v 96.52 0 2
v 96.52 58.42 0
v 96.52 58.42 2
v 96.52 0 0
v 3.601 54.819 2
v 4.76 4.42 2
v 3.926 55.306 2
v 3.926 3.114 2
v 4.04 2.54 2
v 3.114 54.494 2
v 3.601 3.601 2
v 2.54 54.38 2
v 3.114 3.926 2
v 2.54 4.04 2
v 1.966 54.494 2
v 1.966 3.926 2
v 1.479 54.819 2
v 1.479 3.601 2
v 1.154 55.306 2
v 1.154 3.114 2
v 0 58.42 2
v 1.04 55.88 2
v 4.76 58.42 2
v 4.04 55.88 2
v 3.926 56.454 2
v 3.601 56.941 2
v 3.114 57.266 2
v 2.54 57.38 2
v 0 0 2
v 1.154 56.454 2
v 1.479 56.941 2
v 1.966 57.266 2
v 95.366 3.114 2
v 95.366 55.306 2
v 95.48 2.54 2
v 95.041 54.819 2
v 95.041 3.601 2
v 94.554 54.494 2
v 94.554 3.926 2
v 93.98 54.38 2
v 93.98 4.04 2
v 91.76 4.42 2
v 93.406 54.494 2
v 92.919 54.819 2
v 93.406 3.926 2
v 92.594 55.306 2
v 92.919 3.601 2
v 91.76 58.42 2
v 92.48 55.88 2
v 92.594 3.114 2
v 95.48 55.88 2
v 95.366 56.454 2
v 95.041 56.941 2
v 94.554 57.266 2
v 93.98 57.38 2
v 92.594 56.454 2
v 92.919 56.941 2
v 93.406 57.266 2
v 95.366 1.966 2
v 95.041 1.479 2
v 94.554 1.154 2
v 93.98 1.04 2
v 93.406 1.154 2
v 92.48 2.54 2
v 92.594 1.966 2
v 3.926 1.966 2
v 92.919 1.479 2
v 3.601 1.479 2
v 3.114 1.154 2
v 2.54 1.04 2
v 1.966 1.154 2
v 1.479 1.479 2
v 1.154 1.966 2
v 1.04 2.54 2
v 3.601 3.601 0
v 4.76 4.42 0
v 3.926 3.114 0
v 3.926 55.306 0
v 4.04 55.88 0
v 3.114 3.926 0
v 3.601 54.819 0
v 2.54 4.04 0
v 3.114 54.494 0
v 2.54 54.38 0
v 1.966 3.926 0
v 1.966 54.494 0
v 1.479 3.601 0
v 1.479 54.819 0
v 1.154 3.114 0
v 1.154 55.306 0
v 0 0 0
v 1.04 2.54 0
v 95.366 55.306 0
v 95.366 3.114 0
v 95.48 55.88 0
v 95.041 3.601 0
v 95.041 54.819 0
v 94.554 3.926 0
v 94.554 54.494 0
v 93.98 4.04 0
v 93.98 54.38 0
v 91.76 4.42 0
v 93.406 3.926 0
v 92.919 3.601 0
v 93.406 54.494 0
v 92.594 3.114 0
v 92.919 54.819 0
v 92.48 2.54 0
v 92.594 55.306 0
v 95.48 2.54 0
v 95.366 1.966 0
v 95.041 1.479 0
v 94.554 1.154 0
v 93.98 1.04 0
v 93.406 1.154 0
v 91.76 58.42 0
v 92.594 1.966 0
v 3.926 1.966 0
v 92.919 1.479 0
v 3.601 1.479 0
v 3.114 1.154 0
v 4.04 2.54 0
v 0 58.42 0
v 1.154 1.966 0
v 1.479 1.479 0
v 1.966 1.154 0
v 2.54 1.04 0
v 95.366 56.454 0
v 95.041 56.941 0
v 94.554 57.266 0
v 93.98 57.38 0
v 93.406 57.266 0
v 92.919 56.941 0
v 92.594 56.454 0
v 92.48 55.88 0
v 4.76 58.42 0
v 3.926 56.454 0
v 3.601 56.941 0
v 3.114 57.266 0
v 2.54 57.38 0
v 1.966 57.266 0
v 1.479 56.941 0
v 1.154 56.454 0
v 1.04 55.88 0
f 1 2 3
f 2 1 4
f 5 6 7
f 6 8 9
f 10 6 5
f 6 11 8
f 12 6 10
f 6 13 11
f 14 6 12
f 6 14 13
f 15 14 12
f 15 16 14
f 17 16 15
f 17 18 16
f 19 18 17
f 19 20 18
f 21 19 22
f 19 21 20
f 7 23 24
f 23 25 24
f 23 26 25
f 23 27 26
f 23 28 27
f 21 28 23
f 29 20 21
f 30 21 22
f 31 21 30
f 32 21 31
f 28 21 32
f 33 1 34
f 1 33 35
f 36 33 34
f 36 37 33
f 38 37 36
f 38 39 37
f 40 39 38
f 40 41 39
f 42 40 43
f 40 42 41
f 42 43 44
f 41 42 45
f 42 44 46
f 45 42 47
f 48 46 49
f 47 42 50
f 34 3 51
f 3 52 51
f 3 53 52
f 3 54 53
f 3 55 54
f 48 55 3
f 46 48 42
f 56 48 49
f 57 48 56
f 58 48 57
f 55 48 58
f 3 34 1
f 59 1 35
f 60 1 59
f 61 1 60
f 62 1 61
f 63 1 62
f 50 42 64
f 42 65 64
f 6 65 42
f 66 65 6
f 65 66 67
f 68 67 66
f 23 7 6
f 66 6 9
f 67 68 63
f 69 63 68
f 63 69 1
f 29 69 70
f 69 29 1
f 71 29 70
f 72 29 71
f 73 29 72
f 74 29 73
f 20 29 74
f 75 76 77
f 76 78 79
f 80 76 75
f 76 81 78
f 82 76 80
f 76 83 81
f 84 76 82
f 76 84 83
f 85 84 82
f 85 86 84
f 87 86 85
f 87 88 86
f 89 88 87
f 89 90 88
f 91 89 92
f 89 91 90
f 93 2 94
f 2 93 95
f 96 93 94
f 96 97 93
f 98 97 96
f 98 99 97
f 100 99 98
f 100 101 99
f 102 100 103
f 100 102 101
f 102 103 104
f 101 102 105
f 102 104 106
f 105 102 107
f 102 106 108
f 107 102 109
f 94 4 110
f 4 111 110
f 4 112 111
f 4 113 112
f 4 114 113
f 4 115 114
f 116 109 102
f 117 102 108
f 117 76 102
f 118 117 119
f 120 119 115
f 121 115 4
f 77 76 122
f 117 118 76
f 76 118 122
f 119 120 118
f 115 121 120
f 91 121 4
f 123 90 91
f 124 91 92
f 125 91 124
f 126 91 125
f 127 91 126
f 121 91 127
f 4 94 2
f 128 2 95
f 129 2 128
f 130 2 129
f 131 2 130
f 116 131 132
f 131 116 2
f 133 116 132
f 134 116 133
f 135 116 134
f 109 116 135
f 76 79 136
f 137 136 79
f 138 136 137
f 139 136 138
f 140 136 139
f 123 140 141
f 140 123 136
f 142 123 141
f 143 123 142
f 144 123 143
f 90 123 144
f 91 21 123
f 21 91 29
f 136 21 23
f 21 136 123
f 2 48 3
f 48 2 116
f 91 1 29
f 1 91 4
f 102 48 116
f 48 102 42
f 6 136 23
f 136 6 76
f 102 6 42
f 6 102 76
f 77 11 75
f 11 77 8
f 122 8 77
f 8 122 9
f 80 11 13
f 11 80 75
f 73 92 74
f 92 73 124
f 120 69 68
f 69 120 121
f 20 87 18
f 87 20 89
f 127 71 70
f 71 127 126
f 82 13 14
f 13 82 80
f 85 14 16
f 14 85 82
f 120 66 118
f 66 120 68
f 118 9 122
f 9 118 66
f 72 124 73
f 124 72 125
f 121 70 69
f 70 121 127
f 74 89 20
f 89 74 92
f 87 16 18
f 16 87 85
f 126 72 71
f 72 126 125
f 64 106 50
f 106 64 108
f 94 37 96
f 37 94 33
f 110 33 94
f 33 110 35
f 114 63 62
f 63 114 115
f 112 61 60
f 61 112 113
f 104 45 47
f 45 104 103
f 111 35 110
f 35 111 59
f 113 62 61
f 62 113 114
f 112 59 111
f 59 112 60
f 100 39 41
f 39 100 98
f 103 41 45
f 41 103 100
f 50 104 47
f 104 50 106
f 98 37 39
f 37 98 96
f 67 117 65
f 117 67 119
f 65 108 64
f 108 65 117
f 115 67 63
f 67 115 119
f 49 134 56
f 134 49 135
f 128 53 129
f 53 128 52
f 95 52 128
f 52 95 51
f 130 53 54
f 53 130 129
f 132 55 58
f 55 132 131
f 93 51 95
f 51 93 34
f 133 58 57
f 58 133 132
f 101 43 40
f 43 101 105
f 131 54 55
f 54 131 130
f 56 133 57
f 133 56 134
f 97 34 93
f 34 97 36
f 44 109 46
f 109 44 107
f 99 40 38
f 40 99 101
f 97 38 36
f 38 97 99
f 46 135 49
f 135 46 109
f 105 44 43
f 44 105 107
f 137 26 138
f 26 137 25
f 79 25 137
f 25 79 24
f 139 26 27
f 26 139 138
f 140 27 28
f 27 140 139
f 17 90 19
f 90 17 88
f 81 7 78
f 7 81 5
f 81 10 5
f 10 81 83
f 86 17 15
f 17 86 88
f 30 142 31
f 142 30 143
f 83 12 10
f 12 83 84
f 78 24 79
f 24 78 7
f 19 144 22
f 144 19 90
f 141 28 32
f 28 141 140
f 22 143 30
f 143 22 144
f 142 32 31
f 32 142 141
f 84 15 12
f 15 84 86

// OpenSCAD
CW = 85.0;//mm card width   < 34 x 2.54
CH = 54.0;//mm card height  < 22 x 2.54 
CT =  0.9;//mm card thickness

W = 38 * 2.54;// width
H = 23 * 2.54;// height
T =  1 * 2.00;// thickness

color("DeepSkyBlue",0.5)difference() {
    cube([W,H,T]);
    // CARD CUTOUT
    translate([W/2-(CW+2)/2,H-CH,-1])
        cube([CW+2,CH+1,T+2]);
    // PCB HOLES
    *for(X = [0 : 2.54 : W+1]){
        for(Y = [0 : 2.54 : H+1]){
            translate([X,Y,-1])cylinder(T+2,0.5,0.5);
        }
    }
    // DRILL HOLES
    translate([  2.54,  2.54,-1])cylinder(T+2,1.5,1.5,$fn=16);
    translate([W-2.54,  2.54,-1])cylinder(T+2,1.5,1.5,$fn=16);
    translate([W-2.54,H-2.54,-1])cylinder(T+2,1.5,1.5,$fn=16);
    translate([  2.54,H-2.54,-1])cylinder(T+2,1.5,1.5,$fn=16);
}
